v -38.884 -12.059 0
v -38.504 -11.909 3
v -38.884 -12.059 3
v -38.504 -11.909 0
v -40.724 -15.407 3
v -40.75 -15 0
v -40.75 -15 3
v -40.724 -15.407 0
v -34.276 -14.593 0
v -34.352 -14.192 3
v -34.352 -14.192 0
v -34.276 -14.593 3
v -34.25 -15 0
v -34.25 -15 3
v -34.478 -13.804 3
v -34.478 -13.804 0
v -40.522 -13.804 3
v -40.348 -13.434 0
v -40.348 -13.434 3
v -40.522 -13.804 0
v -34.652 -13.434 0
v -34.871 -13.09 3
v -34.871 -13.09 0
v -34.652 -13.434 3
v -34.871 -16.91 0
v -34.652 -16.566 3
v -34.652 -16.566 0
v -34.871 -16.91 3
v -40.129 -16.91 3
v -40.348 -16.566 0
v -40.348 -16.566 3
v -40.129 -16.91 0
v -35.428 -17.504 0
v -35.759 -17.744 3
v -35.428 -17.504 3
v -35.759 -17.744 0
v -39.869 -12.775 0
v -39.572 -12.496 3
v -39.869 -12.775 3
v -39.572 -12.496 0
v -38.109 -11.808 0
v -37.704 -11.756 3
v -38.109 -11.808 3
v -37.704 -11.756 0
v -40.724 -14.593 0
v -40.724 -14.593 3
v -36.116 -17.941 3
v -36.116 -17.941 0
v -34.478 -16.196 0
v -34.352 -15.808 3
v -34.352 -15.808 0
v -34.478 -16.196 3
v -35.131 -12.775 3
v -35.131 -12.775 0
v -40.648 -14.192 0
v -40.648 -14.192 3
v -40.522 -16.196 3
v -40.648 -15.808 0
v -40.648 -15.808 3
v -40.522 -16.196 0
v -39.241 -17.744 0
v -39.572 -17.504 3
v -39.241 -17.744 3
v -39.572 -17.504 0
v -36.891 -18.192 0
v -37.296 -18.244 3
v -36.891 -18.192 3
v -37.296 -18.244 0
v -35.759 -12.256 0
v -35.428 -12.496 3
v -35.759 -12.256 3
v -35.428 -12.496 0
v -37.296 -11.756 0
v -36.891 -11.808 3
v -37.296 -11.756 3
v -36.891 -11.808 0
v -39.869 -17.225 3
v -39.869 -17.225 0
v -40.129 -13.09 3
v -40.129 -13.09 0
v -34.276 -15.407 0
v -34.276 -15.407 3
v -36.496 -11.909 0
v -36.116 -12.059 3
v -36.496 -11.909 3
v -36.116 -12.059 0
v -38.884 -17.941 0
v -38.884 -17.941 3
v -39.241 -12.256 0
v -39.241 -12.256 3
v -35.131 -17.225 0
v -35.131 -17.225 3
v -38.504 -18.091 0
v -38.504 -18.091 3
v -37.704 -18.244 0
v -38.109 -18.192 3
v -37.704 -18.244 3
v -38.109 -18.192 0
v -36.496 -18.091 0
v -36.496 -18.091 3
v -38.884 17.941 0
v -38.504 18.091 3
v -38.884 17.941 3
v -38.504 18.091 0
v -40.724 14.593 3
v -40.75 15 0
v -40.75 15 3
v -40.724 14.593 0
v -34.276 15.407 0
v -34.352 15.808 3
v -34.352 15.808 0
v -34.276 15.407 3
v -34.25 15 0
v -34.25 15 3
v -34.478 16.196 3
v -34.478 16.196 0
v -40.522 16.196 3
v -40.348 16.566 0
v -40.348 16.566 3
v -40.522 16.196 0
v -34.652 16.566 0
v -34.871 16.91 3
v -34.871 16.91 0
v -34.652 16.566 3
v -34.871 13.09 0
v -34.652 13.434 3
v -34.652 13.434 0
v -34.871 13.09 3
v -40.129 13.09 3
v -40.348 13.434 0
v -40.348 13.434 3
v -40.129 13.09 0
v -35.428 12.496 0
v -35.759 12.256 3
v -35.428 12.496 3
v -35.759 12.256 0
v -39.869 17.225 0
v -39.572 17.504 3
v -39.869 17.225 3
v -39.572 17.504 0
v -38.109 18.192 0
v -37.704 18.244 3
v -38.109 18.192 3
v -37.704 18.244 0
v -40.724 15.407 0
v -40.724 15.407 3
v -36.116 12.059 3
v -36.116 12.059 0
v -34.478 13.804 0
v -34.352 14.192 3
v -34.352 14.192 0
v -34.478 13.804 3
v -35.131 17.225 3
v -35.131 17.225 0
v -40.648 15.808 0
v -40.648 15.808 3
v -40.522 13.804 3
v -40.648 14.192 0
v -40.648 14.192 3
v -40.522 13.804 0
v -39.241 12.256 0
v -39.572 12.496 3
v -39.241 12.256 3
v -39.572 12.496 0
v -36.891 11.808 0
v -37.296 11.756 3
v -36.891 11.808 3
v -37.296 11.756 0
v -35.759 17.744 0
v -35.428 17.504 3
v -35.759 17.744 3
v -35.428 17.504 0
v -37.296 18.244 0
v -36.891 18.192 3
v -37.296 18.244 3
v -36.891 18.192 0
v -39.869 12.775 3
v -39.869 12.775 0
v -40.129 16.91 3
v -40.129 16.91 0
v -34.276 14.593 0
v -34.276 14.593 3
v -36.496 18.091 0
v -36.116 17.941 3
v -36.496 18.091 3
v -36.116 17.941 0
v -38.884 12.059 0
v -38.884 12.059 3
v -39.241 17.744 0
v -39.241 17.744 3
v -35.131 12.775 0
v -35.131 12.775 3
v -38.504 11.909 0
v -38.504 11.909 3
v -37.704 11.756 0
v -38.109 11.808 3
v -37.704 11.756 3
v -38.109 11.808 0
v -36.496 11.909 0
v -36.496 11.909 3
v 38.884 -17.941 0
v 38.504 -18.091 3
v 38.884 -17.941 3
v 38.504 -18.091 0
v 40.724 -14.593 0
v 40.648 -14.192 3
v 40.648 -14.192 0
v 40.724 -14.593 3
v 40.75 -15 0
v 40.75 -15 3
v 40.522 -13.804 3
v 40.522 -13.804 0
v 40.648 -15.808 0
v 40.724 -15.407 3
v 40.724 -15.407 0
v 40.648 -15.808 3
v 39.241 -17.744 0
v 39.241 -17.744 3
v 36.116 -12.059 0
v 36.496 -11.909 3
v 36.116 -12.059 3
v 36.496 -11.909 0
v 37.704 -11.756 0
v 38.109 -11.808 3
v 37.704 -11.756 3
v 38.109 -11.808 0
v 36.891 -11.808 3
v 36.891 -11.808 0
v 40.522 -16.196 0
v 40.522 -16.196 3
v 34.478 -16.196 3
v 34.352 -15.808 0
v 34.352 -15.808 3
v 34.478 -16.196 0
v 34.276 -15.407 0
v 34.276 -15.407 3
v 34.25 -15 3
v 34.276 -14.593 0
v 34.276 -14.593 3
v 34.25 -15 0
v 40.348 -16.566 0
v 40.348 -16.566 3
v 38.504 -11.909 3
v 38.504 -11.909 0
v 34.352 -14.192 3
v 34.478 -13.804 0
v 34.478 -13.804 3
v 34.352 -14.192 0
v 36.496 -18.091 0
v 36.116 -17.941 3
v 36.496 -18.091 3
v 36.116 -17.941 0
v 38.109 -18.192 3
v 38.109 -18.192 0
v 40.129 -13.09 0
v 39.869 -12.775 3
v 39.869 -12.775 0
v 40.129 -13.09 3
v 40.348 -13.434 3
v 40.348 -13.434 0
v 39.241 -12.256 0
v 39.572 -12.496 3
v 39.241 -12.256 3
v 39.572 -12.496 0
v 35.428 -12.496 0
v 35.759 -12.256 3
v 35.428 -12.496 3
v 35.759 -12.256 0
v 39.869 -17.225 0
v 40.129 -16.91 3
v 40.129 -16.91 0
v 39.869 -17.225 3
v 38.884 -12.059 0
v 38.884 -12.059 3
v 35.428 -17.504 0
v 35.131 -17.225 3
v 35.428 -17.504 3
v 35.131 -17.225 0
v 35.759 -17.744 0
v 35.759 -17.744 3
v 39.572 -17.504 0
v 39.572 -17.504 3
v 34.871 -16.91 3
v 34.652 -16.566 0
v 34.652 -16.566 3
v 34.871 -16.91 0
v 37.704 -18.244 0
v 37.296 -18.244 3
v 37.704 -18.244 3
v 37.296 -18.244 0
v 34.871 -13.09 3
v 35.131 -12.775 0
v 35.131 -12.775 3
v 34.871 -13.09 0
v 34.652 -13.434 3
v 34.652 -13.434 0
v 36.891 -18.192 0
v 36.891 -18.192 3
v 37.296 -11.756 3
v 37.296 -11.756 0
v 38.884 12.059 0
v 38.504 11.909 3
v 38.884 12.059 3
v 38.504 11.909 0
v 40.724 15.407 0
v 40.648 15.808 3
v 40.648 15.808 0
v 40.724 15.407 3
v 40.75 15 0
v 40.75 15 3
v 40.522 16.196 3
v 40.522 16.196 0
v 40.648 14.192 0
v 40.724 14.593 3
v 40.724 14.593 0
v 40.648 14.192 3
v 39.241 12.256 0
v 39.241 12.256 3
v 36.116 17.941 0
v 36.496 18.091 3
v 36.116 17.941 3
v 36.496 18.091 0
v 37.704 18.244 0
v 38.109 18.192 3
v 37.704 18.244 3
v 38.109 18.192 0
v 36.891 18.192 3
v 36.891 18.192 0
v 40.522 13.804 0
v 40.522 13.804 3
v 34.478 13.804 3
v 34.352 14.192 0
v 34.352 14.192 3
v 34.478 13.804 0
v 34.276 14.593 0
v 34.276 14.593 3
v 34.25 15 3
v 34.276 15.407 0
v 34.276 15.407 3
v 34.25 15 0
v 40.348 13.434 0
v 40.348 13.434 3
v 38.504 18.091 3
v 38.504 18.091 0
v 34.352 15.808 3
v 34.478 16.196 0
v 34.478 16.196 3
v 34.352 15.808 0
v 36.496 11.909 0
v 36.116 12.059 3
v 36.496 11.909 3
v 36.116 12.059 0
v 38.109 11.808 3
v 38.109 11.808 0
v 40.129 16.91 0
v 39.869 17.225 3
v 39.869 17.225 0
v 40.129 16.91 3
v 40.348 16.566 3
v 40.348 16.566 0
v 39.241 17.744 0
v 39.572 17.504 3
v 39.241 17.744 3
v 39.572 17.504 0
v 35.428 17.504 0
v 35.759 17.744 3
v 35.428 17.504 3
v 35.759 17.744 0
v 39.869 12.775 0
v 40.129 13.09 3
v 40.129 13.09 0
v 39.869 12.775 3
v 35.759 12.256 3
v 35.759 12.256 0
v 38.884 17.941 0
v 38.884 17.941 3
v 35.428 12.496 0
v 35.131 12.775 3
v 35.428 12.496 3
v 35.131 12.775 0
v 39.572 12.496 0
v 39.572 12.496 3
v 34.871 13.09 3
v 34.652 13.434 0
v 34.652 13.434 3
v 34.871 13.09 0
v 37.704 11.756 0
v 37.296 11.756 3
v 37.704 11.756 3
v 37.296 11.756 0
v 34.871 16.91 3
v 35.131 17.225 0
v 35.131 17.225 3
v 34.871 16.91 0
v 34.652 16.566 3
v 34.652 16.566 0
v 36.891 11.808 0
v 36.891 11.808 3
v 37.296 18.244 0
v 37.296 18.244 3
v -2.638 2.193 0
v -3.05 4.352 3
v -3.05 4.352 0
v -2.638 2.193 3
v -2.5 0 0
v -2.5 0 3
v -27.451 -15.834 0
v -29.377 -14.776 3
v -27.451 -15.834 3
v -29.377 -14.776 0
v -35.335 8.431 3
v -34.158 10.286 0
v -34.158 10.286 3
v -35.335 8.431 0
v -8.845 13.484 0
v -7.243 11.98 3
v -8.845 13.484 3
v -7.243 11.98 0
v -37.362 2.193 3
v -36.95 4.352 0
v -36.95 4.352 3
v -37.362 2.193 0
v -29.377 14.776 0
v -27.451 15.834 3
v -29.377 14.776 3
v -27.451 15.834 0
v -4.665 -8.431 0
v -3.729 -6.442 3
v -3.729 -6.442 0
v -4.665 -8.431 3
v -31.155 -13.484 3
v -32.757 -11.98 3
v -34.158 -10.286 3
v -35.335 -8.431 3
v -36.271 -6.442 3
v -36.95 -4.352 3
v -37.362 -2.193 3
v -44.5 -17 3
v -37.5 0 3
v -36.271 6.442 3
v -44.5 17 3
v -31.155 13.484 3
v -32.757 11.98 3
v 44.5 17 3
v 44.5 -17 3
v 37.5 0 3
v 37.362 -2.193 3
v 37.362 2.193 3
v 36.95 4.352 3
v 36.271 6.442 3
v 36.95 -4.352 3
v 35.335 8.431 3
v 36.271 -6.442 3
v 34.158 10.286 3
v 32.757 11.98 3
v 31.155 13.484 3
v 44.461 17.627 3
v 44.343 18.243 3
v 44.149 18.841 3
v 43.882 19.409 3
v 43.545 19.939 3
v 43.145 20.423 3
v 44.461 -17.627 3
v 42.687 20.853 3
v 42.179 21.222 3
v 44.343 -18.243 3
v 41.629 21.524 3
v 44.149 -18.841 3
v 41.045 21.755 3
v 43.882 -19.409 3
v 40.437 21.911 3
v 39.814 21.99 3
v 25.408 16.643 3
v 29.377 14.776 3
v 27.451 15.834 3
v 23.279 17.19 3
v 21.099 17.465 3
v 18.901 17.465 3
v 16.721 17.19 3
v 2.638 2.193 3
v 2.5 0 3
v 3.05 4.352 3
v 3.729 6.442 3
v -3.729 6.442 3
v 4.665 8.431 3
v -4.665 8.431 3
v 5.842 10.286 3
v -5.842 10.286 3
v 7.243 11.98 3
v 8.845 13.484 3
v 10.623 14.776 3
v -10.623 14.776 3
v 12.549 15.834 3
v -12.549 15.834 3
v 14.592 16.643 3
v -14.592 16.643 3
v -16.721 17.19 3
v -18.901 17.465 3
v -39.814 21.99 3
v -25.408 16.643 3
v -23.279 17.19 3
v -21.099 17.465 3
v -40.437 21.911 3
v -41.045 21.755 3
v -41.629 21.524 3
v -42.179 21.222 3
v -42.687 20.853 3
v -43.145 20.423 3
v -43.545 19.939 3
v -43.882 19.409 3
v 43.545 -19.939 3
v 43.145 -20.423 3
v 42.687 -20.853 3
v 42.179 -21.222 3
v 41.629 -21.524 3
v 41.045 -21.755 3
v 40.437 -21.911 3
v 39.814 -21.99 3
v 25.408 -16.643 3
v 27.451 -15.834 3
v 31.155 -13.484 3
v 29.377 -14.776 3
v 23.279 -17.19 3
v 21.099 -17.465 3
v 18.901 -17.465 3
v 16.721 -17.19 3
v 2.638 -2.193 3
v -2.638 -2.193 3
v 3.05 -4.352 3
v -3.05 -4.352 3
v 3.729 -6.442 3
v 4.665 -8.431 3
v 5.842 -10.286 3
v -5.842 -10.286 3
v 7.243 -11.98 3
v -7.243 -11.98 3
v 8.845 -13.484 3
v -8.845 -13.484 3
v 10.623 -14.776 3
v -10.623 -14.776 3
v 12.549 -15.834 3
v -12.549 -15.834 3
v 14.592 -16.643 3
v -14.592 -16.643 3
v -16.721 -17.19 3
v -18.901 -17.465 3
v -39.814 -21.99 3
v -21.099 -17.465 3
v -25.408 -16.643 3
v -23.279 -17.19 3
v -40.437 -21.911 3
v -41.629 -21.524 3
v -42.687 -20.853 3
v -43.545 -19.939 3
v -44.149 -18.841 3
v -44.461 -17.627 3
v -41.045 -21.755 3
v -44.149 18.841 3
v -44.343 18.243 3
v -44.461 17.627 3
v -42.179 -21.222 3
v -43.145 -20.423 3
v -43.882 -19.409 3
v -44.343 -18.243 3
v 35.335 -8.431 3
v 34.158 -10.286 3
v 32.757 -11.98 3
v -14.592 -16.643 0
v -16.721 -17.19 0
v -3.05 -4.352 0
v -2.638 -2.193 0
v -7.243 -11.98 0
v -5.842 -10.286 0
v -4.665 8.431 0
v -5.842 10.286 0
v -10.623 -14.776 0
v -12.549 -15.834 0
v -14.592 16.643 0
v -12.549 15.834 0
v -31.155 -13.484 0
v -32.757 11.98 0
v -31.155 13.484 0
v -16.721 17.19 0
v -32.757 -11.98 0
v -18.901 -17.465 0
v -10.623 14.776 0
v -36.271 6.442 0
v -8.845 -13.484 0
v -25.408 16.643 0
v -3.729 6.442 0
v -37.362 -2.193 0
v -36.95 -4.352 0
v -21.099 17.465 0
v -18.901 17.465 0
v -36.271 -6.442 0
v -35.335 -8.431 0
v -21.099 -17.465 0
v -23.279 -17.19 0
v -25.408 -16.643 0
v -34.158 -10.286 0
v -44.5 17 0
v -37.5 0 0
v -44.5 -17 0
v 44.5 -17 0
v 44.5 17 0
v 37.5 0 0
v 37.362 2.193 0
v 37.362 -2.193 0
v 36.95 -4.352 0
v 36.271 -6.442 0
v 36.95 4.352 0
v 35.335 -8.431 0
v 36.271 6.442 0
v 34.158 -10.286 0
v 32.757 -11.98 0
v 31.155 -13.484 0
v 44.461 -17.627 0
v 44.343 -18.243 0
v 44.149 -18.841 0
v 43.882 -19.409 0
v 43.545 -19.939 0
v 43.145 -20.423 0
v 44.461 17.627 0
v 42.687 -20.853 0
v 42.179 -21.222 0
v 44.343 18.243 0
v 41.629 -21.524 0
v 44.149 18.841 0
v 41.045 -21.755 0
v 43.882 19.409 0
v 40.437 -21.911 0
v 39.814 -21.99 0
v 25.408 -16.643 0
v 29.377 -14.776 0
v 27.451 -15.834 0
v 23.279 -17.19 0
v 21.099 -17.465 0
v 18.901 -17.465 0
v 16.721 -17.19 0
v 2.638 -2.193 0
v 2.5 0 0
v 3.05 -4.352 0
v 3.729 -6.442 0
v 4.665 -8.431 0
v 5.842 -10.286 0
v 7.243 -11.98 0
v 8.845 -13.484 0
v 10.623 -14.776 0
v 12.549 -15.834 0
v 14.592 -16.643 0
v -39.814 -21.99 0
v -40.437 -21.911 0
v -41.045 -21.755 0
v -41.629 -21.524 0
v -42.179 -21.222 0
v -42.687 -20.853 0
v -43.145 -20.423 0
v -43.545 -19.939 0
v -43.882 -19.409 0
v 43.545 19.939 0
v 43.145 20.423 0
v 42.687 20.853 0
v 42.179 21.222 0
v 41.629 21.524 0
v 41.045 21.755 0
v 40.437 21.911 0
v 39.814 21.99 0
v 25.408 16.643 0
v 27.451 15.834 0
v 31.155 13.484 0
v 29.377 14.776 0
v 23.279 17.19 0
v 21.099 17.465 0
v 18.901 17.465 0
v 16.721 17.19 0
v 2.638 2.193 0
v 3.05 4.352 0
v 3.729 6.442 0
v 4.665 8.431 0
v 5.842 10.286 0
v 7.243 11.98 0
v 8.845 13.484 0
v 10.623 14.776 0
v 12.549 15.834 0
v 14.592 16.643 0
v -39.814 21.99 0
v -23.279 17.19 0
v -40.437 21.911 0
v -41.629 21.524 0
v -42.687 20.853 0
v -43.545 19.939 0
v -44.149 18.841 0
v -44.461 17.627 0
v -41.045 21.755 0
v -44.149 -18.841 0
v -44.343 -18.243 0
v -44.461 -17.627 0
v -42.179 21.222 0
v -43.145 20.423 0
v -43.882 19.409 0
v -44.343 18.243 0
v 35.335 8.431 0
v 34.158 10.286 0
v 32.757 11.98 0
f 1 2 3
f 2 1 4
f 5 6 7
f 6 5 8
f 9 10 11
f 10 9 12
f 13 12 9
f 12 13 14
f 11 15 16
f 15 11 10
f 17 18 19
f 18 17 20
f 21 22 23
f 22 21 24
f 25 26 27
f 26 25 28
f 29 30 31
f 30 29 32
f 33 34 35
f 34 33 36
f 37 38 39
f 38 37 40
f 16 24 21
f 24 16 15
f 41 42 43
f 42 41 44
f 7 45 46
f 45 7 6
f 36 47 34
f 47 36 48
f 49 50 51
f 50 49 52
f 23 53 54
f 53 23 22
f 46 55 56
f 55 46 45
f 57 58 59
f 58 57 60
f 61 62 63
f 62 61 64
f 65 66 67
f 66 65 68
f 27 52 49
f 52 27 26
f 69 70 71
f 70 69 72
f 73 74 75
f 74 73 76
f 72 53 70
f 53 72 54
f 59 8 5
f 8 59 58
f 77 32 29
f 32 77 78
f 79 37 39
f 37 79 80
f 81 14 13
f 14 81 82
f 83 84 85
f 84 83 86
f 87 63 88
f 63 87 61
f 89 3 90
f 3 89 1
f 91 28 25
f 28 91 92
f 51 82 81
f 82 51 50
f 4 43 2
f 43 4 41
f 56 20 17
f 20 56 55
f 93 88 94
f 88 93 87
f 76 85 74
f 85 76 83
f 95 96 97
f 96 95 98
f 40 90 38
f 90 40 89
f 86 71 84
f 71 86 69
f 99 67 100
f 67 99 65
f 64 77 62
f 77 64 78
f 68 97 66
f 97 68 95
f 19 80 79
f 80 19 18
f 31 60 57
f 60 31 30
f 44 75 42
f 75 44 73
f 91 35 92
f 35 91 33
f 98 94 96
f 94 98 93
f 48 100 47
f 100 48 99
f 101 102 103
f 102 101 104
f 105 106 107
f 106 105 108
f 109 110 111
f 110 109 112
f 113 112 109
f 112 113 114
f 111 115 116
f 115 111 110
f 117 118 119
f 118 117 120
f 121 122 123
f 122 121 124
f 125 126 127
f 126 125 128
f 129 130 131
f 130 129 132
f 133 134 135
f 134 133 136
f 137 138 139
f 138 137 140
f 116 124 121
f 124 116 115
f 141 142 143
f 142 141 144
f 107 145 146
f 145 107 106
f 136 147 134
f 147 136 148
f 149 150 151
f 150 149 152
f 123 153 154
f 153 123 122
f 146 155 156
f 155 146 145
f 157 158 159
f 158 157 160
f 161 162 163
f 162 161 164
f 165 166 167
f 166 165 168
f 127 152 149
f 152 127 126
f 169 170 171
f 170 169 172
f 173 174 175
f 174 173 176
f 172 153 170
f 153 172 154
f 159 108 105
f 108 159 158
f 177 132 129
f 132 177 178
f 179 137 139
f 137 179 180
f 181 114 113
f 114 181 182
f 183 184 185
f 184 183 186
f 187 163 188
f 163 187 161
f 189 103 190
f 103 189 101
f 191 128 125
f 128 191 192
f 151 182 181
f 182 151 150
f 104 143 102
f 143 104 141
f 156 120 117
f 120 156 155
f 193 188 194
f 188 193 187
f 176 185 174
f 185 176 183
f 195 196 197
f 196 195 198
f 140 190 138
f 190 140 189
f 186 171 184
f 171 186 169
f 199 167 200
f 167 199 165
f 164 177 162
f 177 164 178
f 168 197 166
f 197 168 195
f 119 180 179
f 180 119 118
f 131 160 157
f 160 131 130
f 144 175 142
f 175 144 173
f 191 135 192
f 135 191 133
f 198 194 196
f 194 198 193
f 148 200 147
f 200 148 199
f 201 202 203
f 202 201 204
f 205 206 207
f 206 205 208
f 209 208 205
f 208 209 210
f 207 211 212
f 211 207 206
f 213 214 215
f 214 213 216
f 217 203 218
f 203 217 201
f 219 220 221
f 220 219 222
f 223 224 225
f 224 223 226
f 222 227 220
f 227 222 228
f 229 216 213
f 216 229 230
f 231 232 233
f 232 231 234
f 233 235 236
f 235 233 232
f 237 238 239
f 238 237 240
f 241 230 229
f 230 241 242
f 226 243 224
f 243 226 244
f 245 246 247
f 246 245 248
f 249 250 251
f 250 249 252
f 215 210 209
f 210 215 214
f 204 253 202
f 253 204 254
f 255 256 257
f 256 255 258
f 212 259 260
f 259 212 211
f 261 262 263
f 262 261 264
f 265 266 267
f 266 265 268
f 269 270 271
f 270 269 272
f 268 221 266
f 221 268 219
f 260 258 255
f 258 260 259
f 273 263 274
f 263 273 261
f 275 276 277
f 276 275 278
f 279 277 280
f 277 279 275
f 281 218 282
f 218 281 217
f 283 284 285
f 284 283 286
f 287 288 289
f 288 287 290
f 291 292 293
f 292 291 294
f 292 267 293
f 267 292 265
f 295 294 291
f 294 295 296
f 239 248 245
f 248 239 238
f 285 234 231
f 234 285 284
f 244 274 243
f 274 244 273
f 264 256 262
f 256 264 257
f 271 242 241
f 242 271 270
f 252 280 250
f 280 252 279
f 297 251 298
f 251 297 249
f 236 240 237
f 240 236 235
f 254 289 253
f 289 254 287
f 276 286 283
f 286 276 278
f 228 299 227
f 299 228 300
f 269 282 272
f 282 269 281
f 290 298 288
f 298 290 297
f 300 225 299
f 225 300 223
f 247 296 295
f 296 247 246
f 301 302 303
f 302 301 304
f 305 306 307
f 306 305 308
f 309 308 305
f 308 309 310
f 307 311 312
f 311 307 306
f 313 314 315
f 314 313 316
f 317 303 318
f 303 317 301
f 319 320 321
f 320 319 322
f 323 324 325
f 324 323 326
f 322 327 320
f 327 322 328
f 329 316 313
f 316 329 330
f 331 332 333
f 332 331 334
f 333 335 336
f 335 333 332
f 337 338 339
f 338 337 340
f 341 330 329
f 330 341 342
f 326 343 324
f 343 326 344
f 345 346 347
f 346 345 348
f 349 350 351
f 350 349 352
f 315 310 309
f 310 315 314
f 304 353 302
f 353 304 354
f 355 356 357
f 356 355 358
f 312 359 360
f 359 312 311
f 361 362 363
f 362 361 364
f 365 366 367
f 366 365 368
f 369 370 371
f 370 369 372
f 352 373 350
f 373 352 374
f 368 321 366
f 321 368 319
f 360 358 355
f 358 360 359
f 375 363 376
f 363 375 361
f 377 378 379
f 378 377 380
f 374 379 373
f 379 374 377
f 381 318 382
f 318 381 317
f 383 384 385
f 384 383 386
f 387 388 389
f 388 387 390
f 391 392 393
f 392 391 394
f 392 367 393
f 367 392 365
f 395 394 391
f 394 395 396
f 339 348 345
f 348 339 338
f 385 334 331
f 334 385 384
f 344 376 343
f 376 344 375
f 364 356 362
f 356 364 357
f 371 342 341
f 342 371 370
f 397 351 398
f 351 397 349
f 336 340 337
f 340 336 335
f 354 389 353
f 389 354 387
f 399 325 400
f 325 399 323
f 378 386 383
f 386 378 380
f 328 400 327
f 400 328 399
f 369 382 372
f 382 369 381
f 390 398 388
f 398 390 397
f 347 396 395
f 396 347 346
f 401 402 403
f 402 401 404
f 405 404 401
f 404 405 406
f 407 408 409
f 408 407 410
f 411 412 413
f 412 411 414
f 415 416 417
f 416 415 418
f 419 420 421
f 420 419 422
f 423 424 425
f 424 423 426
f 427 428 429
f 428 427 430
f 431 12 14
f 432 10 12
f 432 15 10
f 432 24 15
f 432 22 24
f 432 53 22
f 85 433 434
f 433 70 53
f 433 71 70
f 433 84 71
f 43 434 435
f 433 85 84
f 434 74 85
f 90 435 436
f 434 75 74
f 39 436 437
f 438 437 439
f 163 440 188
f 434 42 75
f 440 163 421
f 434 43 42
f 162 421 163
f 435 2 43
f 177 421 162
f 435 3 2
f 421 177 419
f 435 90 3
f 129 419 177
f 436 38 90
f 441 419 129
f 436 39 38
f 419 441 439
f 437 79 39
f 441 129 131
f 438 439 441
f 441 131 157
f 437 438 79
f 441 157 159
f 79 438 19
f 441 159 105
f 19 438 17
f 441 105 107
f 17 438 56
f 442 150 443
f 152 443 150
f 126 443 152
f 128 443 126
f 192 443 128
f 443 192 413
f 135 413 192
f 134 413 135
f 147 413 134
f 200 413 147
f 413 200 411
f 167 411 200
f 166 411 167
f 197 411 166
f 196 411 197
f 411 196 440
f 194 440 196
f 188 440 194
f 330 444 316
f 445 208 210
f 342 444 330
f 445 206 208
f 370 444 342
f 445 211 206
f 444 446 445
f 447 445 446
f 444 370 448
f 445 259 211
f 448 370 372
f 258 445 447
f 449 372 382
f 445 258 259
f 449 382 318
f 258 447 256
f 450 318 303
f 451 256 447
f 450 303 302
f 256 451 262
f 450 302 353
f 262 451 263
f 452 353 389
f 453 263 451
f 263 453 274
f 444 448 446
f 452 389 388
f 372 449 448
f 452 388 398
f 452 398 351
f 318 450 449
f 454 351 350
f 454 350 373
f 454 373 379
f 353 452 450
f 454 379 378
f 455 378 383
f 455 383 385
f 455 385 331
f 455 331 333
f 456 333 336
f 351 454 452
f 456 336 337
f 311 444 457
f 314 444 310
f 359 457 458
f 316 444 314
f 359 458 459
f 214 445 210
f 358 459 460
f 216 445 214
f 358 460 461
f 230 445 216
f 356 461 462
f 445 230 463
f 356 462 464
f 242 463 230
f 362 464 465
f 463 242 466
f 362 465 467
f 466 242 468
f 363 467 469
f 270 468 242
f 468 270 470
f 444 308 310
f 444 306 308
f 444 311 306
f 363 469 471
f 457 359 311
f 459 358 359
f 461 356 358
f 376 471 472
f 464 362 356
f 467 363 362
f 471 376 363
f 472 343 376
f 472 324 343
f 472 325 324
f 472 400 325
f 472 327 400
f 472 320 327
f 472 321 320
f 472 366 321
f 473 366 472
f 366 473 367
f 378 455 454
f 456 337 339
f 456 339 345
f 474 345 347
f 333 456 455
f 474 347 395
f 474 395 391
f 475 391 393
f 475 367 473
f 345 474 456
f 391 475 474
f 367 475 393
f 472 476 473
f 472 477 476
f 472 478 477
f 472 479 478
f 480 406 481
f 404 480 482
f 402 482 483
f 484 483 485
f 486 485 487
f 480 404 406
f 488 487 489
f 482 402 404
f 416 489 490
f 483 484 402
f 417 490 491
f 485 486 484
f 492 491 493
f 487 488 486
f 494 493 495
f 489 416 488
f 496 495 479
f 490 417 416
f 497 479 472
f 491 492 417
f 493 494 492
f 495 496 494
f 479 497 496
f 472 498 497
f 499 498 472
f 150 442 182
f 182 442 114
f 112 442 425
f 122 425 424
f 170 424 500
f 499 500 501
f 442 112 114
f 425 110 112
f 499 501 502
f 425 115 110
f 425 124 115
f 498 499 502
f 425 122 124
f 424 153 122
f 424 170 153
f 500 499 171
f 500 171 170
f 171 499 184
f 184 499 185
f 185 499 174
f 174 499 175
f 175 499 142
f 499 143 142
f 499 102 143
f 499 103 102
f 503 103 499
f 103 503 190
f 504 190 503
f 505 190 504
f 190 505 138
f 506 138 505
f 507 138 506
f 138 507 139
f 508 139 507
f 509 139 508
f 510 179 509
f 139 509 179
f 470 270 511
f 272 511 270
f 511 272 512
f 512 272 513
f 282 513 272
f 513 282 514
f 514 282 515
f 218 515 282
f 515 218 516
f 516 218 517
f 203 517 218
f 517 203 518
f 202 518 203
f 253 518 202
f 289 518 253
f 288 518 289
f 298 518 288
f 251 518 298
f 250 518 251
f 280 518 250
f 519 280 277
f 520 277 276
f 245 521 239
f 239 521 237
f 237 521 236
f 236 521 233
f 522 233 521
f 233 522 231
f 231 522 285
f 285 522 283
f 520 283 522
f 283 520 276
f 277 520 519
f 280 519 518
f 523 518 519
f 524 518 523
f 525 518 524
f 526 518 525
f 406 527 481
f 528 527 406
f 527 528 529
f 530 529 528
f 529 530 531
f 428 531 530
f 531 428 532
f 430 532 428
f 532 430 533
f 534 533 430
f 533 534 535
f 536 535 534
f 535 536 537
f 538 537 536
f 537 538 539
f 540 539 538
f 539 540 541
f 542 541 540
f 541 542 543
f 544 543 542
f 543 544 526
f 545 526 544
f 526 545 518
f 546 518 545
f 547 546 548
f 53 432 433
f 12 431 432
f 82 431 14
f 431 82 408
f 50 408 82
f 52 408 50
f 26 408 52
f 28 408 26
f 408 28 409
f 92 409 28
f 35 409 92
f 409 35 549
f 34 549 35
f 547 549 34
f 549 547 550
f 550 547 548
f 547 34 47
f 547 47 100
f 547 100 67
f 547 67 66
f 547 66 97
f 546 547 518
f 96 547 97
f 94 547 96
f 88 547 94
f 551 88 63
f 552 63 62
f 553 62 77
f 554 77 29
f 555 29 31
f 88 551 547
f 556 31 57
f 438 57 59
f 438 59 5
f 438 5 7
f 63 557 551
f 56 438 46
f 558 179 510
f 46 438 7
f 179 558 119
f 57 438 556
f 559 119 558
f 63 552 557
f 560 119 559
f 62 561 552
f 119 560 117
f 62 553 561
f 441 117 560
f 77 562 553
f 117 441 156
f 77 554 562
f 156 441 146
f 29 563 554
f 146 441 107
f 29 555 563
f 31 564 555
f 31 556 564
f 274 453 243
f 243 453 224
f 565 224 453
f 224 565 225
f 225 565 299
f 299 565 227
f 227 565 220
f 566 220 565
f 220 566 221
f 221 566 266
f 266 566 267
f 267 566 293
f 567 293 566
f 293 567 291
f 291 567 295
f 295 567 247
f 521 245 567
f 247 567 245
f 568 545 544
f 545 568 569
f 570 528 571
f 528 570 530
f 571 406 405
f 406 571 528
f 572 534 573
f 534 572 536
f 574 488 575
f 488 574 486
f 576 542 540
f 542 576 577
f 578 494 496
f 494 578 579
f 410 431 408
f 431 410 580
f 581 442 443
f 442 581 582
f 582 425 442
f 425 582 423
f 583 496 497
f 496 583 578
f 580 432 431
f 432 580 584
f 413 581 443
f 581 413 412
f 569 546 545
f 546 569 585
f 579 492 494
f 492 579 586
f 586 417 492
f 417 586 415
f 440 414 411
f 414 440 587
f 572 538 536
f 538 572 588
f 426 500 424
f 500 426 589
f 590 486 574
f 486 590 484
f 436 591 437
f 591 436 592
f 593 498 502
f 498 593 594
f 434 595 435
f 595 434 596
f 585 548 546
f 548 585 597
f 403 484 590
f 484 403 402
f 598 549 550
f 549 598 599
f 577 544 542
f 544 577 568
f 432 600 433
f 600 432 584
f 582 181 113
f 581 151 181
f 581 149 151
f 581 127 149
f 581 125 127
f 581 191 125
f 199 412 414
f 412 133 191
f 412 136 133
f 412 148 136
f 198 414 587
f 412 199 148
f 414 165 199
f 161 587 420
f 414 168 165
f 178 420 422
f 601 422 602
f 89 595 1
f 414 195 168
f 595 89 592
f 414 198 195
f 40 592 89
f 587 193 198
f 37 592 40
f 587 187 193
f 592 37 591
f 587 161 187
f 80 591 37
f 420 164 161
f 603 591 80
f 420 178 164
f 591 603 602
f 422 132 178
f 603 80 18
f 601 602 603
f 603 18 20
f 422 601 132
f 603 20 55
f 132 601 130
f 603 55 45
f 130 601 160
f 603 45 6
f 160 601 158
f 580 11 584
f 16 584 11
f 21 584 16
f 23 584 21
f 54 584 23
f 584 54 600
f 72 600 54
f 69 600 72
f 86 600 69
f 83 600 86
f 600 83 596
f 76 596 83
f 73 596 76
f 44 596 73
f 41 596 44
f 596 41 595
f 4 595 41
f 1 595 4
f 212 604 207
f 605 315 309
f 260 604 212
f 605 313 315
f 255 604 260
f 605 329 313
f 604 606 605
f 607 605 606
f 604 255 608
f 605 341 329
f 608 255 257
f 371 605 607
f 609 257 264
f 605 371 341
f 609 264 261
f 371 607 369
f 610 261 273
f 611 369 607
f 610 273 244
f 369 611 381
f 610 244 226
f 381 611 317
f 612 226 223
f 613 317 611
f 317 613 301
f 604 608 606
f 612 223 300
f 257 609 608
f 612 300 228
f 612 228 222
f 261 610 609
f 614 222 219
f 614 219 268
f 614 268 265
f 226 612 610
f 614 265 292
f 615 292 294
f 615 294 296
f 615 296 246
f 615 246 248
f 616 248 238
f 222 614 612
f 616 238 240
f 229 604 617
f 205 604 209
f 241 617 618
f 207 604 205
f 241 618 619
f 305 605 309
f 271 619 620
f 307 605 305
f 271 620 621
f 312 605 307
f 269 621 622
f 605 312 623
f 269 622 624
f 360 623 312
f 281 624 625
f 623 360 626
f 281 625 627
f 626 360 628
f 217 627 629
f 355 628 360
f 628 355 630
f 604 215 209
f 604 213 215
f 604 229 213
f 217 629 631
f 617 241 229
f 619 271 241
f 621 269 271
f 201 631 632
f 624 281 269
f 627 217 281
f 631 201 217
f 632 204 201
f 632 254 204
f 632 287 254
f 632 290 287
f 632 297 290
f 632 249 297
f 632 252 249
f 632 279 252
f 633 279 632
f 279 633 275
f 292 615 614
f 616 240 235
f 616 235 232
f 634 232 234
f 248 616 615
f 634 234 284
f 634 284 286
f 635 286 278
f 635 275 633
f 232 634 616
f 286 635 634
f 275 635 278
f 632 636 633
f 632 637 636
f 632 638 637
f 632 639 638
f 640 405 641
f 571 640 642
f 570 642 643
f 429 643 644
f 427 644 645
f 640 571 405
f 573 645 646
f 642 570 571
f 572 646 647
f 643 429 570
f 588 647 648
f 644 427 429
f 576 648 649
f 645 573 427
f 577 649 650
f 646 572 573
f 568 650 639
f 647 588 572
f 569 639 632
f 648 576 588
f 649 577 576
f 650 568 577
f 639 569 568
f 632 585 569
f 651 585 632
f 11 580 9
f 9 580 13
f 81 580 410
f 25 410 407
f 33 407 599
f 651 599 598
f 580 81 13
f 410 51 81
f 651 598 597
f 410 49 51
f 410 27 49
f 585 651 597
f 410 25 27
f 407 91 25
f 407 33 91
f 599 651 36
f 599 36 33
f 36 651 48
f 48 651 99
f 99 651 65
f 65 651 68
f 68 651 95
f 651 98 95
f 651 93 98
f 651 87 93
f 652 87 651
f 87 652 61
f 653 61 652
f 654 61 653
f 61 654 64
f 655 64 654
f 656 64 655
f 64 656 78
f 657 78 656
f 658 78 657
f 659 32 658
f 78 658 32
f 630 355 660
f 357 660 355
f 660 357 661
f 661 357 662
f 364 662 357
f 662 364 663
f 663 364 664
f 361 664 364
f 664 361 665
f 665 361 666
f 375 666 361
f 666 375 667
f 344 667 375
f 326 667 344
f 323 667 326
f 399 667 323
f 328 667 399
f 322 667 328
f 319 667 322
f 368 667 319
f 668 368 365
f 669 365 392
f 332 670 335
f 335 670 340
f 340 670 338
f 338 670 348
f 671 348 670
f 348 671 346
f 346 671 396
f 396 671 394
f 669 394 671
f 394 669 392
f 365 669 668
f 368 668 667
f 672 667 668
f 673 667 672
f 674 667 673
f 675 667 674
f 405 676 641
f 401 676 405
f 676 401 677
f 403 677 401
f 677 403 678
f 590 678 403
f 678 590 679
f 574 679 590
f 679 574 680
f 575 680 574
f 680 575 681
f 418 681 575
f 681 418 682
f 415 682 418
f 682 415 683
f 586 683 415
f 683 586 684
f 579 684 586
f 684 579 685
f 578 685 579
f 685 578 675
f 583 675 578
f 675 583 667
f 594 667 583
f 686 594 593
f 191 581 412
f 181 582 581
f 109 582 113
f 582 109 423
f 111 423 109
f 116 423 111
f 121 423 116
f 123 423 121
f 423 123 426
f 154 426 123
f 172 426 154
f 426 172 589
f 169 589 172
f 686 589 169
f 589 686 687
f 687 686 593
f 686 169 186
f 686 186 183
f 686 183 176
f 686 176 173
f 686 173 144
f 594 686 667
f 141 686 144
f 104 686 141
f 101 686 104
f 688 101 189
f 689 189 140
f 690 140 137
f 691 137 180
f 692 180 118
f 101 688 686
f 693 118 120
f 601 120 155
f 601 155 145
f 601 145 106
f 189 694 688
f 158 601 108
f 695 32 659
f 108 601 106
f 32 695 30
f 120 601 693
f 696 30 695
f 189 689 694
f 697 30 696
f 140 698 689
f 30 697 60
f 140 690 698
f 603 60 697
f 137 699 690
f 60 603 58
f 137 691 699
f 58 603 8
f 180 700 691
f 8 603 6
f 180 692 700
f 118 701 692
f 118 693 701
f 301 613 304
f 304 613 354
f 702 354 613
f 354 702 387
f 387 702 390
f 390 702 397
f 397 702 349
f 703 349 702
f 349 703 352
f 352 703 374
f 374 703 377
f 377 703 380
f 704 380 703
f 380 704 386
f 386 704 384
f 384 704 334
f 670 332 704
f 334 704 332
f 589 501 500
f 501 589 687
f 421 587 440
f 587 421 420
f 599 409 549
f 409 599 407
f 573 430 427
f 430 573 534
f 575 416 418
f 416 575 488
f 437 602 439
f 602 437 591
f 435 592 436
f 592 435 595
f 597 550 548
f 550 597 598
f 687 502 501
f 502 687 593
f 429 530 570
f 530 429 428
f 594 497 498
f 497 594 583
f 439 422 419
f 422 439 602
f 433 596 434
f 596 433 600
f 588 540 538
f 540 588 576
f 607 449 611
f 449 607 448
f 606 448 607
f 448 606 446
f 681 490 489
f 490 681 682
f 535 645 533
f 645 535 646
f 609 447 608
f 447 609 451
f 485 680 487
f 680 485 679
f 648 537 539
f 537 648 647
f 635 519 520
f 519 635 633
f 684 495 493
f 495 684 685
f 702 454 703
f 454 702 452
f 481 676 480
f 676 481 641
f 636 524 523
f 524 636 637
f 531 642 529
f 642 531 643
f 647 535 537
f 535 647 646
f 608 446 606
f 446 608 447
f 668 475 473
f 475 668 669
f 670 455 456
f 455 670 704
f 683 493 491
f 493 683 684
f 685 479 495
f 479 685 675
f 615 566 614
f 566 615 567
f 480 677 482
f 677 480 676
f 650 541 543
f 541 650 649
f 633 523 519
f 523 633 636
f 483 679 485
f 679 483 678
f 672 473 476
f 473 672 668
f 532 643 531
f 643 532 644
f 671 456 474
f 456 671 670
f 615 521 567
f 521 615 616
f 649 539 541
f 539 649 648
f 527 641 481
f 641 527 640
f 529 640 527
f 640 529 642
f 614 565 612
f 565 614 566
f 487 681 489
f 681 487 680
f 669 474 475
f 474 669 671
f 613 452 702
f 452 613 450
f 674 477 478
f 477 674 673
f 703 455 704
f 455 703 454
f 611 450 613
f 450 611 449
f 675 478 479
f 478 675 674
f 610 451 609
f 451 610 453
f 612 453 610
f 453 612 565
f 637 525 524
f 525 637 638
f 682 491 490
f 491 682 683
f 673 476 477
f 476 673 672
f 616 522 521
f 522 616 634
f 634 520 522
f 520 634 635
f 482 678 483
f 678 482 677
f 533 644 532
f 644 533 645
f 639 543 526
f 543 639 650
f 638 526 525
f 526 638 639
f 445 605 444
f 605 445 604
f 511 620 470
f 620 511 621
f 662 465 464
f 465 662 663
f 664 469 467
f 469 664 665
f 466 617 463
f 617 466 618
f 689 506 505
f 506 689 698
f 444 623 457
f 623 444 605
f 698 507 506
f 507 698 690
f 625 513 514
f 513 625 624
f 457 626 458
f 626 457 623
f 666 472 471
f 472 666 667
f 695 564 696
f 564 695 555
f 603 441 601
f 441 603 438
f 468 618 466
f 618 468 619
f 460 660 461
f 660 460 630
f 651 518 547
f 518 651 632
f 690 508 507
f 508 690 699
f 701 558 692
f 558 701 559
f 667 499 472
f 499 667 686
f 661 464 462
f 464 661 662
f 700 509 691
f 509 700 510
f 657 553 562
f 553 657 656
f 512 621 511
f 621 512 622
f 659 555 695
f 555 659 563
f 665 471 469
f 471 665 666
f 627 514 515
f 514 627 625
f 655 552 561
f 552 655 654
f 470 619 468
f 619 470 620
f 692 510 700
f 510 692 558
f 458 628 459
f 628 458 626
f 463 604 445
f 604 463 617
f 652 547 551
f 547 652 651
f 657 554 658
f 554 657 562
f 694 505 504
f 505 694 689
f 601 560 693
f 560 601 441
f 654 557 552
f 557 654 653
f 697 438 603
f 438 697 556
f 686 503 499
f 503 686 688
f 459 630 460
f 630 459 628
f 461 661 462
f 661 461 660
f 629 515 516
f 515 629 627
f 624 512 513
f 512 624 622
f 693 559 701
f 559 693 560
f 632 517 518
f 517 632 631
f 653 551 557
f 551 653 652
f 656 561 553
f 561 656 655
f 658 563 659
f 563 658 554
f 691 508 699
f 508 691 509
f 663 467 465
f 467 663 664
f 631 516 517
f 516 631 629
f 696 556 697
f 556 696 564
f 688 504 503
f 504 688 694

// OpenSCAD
$fn = 50;


difference() {
	union() {
		hull() {
			translate(v = [-39.5000000000, 17.0000000000, 0]) {
				cylinder(h = 3, r = 5);
			}
			translate(v = [39.5000000000, 17.0000000000, 0]) {
				cylinder(h = 3, r = 5);
			}
			translate(v = [-39.5000000000, -17.0000000000, 0]) {
				cylinder(h = 3, r = 5);
			}
			translate(v = [39.5000000000, -17.0000000000, 0]) {
				cylinder(h = 3, r = 5);
			}
		}
	}
	union() {
		#translate(v = [-37.5000000000, -15.0000000000, -100.0000000000]) {
			cylinder(h = 200, r = 3.2500000000);
		}
		#translate(v = [-37.5000000000, 15.0000000000, -100.0000000000]) {
			cylinder(h = 200, r = 3.2500000000);
		}
		#translate(v = [37.5000000000, -15.0000000000, -100.0000000000]) {
			cylinder(h = 200, r = 3.2500000000);
		}
		#translate(v = [37.5000000000, 15.0000000000, -100.0000000000]) {
			cylinder(h = 200, r = 3.2500000000);
		}
		#translate(v = [-20.0000000000, 0, 0]) {
			cylinder(h = 3, r = 17.5000000000);
		}
		#translate(v = [20.0000000000, 0, 0]) {
			cylinder(h = 3, r = 17.5000000000);
		}
	}
}
